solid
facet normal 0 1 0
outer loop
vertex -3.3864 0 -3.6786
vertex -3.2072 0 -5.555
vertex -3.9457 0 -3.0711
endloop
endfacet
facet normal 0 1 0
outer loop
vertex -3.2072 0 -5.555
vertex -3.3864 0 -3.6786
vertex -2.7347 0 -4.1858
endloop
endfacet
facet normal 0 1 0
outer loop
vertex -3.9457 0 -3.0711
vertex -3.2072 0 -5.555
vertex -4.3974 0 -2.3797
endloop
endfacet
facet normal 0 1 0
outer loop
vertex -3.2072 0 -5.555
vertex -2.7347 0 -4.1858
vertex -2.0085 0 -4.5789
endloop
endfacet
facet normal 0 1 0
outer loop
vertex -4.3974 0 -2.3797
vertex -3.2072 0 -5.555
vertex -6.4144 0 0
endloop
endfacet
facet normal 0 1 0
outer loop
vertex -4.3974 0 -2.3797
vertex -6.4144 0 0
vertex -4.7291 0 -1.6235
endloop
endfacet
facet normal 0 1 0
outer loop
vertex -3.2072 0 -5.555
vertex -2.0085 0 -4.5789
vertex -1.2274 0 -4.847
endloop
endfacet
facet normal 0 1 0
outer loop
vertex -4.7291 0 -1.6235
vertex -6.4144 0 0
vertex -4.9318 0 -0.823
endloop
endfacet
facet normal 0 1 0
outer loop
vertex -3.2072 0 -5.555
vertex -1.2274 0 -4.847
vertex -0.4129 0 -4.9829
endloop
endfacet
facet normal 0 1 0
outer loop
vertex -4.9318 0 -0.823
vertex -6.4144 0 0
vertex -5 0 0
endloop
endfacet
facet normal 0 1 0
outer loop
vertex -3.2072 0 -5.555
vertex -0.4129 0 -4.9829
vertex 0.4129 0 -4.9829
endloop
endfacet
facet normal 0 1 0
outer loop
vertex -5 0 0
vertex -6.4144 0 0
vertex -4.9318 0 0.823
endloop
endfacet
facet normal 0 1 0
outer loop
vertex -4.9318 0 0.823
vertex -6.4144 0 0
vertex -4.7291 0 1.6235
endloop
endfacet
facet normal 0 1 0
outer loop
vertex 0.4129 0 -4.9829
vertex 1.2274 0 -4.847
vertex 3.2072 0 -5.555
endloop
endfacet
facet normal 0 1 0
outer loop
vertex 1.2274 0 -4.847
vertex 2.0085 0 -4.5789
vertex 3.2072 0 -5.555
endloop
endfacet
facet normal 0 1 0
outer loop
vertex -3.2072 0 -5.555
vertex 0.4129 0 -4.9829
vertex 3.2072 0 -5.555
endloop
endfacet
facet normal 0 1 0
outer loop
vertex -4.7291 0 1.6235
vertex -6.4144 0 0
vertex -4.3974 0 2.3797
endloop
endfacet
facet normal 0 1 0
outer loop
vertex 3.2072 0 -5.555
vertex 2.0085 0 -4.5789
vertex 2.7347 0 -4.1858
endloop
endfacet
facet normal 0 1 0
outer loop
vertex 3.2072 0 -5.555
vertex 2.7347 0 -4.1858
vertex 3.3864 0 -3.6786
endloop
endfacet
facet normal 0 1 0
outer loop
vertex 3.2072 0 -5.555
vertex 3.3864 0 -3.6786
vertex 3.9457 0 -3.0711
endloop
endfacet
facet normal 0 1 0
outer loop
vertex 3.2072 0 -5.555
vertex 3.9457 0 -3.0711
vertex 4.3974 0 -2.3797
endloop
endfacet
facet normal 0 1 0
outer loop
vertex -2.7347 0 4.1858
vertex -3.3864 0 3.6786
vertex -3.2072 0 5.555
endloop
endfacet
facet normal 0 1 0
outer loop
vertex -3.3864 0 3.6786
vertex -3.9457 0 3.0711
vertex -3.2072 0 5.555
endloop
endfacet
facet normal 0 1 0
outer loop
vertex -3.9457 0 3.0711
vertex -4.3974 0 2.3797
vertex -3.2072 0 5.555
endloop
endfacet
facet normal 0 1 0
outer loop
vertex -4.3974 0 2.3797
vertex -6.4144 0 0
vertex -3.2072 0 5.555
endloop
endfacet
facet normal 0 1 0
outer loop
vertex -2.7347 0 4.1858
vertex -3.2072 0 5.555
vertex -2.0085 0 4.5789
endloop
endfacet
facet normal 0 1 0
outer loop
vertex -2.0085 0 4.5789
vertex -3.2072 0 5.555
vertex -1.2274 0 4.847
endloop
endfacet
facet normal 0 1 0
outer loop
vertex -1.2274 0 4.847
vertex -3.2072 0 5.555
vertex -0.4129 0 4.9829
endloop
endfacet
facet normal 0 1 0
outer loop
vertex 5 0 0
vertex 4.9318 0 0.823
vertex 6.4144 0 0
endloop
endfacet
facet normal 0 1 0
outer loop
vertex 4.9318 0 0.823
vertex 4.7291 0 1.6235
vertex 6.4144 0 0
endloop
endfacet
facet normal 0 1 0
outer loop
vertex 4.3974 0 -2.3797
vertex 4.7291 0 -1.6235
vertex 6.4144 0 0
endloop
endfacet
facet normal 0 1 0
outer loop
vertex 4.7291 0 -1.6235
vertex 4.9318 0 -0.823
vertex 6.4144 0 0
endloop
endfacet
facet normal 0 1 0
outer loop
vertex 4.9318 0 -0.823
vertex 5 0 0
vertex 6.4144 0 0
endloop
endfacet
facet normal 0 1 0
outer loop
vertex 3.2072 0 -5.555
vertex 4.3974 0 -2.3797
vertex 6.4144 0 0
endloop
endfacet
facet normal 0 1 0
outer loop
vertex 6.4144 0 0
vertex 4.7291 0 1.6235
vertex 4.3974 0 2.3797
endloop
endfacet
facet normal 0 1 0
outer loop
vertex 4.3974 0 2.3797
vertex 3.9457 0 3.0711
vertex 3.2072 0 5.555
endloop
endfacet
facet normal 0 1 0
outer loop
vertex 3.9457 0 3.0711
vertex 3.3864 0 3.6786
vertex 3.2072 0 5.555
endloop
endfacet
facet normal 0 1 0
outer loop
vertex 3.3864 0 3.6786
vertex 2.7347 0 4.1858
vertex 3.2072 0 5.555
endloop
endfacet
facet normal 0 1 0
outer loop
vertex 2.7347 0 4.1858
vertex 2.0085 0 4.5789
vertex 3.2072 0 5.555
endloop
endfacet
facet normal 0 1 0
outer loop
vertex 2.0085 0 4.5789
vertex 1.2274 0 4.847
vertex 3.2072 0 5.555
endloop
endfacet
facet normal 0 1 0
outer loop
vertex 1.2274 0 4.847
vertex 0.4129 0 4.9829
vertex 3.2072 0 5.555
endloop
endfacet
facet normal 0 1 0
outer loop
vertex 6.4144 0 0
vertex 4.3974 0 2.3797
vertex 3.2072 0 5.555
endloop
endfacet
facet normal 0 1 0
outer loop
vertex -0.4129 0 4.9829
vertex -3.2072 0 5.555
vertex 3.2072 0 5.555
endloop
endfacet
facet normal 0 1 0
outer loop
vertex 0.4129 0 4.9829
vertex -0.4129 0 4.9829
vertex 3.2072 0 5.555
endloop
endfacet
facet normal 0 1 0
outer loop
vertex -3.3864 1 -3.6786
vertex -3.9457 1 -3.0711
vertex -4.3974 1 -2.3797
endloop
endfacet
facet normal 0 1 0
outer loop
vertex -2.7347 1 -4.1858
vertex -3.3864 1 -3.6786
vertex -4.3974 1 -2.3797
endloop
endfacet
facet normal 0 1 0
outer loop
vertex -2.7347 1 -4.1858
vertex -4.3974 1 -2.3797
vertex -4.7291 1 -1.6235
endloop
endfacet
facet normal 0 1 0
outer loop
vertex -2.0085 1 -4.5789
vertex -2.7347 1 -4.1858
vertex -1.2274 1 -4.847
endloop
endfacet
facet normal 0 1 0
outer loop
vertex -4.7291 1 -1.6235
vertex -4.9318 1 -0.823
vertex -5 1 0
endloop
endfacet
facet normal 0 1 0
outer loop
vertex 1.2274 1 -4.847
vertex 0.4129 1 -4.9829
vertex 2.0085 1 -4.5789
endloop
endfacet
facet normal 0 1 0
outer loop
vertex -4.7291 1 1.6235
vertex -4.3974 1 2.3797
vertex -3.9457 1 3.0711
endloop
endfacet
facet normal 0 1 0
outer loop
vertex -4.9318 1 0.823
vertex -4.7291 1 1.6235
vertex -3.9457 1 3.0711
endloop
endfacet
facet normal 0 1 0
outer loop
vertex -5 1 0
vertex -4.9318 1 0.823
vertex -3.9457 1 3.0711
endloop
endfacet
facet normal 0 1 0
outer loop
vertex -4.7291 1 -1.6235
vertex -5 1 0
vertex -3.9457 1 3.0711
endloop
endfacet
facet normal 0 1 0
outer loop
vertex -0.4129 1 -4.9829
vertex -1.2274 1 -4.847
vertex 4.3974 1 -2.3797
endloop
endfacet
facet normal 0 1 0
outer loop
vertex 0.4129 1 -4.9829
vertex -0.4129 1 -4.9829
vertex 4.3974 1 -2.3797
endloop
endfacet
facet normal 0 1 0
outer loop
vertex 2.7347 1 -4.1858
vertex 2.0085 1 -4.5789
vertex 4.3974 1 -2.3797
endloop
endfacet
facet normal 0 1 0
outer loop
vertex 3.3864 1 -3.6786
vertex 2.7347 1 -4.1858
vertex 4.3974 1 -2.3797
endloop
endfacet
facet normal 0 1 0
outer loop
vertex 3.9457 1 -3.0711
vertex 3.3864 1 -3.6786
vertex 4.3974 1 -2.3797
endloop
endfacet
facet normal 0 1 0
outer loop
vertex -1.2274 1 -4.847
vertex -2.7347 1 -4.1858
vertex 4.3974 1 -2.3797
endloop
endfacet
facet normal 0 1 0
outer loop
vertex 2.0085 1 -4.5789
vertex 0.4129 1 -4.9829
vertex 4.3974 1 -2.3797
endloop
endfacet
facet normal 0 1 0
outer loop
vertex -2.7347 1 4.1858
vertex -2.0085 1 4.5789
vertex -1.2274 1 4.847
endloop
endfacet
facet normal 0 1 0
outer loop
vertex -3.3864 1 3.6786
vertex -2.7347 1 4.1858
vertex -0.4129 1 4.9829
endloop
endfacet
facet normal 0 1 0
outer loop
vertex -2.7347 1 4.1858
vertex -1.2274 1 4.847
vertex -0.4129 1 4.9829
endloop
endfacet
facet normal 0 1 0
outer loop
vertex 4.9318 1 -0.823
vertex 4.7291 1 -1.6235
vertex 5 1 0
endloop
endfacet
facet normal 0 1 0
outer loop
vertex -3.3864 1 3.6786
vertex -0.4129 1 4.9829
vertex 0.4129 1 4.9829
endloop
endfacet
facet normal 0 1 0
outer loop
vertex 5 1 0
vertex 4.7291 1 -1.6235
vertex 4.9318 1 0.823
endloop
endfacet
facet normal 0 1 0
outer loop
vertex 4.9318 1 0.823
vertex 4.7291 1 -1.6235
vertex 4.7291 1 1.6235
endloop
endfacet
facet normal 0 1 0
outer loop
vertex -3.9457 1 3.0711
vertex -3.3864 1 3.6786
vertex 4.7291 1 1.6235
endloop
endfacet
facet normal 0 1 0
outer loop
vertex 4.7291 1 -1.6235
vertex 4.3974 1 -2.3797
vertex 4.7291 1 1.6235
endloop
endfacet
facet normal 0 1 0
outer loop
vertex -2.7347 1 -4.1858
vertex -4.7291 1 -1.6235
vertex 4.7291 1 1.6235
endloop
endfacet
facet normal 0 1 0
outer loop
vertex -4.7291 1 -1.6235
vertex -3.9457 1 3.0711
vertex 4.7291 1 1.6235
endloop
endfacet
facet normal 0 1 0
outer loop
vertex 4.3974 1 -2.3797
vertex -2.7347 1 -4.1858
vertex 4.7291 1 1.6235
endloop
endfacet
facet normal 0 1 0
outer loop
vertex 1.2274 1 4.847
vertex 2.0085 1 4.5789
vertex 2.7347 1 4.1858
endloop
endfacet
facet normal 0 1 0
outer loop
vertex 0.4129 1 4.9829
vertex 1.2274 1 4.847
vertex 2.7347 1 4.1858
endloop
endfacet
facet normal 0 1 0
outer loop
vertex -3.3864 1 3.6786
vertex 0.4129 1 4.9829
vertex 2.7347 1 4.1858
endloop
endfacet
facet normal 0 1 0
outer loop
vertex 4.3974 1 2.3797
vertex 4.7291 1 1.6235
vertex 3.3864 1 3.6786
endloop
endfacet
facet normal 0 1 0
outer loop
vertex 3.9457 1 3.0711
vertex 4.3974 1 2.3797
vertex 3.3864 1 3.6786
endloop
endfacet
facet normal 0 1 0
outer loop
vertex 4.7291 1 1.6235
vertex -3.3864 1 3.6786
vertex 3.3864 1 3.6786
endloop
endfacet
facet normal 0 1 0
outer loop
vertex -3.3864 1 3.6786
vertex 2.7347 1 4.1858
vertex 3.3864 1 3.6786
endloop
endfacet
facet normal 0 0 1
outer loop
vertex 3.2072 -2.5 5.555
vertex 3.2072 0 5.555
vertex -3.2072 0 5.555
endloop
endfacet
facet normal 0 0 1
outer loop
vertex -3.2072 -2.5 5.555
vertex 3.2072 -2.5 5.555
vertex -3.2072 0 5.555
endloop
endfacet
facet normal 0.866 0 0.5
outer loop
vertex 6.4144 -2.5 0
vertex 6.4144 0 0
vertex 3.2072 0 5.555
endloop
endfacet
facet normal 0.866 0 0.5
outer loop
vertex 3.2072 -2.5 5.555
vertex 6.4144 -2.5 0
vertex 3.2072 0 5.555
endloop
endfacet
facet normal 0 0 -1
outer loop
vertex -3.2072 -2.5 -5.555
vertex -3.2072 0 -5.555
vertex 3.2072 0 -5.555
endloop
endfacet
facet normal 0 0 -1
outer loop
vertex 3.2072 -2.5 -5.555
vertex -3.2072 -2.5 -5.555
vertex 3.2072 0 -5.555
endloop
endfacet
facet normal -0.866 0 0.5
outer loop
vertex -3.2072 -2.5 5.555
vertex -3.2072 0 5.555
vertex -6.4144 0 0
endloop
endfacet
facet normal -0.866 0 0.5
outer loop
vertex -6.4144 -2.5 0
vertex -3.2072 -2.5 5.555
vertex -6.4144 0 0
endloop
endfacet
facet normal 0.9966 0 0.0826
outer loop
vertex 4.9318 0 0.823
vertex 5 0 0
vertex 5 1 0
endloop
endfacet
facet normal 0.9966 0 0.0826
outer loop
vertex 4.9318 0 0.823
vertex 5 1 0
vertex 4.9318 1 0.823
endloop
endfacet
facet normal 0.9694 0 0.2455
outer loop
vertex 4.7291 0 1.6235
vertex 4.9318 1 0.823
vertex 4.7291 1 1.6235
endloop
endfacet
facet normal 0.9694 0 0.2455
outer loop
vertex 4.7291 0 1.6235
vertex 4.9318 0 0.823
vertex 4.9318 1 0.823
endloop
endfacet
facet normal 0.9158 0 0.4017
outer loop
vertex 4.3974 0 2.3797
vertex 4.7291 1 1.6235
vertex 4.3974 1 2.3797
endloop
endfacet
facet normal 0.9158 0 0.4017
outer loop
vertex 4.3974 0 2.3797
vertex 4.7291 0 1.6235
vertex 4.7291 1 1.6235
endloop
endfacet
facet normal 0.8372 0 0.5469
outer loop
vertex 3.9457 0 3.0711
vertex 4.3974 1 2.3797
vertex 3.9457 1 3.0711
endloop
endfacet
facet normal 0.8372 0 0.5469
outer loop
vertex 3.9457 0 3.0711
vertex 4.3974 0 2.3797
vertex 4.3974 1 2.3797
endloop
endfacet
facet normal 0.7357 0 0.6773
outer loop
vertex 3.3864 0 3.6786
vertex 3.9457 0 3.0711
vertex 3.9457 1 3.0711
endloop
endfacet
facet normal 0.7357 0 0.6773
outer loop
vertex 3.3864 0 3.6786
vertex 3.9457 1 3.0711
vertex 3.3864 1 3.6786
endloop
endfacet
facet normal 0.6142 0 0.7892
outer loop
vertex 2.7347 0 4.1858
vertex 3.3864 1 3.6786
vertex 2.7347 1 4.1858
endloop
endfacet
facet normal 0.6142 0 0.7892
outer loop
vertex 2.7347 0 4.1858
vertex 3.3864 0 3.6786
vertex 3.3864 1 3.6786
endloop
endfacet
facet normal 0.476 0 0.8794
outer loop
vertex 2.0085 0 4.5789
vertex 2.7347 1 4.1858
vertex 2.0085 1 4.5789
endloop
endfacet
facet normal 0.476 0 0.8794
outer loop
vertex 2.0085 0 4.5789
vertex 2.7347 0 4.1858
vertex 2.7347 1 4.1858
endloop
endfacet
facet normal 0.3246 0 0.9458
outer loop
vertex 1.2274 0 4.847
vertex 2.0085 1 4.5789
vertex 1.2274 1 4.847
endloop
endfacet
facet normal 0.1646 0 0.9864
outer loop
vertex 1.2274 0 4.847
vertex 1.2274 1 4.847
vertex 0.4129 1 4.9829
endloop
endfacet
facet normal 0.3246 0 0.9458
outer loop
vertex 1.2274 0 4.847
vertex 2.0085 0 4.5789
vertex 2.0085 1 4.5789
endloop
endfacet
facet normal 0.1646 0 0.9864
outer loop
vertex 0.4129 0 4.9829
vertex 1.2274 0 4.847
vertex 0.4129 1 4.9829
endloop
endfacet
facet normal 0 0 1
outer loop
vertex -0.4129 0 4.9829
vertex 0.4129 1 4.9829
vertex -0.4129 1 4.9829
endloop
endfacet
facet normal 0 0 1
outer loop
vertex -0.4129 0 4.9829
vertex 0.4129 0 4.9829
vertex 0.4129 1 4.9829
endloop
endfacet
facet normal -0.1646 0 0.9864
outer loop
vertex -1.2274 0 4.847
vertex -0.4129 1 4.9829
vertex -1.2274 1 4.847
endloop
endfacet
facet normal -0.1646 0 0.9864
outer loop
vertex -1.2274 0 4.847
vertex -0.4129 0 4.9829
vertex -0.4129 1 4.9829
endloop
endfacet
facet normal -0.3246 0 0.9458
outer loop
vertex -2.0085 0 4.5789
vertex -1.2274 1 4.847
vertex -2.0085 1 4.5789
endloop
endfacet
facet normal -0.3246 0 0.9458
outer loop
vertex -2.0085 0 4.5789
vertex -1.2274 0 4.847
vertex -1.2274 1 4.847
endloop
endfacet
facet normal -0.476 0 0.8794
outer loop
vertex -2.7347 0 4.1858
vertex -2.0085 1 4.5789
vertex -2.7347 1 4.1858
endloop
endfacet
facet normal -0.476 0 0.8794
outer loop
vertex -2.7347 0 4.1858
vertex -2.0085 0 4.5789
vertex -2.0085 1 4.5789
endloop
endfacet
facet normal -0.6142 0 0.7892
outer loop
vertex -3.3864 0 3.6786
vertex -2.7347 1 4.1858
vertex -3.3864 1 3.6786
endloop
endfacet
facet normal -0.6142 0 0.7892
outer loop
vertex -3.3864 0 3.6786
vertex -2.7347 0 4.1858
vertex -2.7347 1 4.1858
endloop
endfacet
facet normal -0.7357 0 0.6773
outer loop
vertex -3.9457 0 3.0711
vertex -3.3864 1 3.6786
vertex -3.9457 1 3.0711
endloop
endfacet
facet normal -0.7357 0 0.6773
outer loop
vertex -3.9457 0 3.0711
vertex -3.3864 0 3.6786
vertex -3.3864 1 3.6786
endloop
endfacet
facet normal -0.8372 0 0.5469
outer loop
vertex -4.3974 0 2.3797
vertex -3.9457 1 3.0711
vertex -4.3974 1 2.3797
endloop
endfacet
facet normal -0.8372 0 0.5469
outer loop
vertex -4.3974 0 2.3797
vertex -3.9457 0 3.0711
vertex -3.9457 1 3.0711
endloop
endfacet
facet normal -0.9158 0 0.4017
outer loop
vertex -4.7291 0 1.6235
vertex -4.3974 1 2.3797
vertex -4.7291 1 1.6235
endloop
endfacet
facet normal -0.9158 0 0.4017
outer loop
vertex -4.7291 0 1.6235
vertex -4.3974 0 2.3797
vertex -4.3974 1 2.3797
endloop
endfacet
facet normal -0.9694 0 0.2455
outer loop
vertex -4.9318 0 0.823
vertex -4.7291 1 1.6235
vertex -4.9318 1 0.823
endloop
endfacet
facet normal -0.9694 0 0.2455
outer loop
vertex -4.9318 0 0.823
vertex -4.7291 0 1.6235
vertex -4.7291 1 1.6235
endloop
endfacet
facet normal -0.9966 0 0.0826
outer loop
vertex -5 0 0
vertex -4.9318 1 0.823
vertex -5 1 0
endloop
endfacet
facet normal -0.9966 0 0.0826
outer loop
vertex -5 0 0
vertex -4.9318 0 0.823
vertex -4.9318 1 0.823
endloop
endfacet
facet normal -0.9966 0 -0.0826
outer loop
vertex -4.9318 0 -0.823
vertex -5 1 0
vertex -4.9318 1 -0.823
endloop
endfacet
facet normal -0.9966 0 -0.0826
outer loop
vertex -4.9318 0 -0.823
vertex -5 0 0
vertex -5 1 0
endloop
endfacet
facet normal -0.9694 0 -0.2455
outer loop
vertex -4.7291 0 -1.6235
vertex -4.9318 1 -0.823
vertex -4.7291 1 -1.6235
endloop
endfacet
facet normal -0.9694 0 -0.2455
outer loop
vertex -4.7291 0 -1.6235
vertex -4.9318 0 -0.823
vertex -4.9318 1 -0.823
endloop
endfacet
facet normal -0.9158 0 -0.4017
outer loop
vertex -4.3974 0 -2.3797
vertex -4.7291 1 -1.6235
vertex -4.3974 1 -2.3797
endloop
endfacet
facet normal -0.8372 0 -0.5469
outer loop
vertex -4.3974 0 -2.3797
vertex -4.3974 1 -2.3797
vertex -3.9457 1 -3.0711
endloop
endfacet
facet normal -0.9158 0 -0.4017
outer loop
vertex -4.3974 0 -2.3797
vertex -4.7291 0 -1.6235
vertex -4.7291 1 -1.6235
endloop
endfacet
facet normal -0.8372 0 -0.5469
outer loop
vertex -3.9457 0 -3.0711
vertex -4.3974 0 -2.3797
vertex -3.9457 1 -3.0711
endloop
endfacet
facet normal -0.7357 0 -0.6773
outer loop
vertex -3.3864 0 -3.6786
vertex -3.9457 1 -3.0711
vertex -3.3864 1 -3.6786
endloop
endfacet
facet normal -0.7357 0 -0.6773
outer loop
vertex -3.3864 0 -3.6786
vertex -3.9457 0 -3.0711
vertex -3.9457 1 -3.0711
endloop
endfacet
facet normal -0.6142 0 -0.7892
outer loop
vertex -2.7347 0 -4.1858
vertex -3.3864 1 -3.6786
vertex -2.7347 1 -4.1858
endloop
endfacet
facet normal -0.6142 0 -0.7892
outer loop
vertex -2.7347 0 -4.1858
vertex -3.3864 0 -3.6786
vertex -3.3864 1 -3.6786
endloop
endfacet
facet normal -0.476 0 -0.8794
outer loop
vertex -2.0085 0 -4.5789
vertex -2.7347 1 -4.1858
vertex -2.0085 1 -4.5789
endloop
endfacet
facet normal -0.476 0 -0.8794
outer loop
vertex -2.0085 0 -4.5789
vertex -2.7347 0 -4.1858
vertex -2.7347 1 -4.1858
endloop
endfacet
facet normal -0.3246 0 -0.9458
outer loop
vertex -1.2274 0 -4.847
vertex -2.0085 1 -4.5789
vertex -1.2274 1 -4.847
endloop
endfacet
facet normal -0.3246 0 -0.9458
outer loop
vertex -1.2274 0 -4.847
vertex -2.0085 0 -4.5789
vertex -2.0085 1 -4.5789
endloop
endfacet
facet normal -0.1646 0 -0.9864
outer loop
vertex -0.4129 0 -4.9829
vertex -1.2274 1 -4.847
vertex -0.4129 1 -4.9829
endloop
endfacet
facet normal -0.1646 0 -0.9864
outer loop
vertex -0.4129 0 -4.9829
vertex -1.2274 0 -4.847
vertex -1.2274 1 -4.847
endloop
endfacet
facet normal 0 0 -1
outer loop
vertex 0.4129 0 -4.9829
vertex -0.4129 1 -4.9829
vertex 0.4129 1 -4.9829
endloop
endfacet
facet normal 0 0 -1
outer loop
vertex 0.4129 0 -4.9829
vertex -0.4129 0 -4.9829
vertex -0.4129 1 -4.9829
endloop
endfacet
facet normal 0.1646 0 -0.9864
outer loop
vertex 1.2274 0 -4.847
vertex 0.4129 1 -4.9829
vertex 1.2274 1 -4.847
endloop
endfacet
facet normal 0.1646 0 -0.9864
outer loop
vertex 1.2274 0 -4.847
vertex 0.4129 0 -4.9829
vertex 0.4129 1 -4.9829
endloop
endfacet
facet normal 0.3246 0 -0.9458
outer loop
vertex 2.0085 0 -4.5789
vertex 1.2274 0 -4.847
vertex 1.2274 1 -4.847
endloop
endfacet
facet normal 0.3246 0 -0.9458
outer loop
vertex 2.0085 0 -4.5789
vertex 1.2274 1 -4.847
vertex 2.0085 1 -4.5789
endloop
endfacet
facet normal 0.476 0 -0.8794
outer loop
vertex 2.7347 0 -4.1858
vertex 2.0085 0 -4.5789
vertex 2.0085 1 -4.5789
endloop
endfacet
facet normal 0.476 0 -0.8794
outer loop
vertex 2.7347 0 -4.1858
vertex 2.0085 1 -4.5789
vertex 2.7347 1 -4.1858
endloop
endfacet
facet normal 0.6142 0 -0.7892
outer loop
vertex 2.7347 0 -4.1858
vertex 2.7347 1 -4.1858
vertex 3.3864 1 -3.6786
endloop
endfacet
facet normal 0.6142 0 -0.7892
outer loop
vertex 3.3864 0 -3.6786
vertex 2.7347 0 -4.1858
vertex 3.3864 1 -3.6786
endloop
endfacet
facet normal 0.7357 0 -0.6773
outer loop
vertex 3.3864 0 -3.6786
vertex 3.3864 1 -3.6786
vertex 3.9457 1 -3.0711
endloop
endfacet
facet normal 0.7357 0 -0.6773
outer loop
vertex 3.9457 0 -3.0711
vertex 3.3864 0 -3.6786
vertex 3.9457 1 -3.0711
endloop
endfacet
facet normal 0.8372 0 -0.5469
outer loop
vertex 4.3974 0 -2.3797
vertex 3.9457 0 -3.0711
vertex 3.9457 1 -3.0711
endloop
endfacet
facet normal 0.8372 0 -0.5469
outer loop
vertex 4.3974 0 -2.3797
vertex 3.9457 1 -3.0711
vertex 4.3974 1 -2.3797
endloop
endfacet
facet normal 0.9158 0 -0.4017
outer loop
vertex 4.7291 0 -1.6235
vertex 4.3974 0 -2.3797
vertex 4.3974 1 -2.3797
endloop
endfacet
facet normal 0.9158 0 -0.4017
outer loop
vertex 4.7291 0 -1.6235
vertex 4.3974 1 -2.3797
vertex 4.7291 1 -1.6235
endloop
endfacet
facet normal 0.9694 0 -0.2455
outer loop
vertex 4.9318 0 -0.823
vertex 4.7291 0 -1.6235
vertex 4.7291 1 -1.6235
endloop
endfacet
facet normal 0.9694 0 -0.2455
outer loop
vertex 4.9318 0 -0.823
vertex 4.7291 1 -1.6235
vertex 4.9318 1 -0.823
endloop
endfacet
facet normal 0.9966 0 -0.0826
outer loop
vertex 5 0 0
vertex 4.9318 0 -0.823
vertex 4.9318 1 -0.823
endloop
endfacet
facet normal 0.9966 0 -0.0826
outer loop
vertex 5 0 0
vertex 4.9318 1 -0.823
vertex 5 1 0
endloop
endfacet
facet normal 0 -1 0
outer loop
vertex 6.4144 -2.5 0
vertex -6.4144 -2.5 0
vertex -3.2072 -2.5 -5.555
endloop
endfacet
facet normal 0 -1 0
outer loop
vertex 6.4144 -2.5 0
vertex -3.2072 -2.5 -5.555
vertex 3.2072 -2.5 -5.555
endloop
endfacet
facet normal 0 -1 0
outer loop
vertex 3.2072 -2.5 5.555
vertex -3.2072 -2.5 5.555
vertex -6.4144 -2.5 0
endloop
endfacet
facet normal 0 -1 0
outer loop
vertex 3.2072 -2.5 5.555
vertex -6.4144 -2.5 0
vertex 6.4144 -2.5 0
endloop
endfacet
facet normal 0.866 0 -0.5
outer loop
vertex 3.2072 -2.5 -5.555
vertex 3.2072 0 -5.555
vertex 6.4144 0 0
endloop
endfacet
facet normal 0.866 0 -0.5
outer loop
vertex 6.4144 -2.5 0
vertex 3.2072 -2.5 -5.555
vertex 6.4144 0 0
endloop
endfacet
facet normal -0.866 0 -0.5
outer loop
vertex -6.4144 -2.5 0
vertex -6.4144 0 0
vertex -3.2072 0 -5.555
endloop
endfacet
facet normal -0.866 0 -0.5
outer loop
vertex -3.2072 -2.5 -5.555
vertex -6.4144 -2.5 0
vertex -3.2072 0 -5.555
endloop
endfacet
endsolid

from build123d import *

# Parameters (mm, degrees)
F1_DEPTH = 2.5
F2_R     = 5
F3_DEPTH = 1


with BuildPart() as f1:
    # F0 (on Front) → F1 (new body)
    with BuildSketch(Plane.XZ):
        Polygon((3.207181, 5.555), (-3.207181, 5.555), (-6.414361, 0), (-3.207181, -5.555), (3.207181, -5.555), (6.414361, 0), align=None)
    extrude(amount=F1_DEPTH)

    # F2 (on Front) → F3 (join)
    with BuildSketch(Plane.XZ):
        Circle(F2_R)
    extrude(amount=-F3_DEPTH)


solid = f1.part
